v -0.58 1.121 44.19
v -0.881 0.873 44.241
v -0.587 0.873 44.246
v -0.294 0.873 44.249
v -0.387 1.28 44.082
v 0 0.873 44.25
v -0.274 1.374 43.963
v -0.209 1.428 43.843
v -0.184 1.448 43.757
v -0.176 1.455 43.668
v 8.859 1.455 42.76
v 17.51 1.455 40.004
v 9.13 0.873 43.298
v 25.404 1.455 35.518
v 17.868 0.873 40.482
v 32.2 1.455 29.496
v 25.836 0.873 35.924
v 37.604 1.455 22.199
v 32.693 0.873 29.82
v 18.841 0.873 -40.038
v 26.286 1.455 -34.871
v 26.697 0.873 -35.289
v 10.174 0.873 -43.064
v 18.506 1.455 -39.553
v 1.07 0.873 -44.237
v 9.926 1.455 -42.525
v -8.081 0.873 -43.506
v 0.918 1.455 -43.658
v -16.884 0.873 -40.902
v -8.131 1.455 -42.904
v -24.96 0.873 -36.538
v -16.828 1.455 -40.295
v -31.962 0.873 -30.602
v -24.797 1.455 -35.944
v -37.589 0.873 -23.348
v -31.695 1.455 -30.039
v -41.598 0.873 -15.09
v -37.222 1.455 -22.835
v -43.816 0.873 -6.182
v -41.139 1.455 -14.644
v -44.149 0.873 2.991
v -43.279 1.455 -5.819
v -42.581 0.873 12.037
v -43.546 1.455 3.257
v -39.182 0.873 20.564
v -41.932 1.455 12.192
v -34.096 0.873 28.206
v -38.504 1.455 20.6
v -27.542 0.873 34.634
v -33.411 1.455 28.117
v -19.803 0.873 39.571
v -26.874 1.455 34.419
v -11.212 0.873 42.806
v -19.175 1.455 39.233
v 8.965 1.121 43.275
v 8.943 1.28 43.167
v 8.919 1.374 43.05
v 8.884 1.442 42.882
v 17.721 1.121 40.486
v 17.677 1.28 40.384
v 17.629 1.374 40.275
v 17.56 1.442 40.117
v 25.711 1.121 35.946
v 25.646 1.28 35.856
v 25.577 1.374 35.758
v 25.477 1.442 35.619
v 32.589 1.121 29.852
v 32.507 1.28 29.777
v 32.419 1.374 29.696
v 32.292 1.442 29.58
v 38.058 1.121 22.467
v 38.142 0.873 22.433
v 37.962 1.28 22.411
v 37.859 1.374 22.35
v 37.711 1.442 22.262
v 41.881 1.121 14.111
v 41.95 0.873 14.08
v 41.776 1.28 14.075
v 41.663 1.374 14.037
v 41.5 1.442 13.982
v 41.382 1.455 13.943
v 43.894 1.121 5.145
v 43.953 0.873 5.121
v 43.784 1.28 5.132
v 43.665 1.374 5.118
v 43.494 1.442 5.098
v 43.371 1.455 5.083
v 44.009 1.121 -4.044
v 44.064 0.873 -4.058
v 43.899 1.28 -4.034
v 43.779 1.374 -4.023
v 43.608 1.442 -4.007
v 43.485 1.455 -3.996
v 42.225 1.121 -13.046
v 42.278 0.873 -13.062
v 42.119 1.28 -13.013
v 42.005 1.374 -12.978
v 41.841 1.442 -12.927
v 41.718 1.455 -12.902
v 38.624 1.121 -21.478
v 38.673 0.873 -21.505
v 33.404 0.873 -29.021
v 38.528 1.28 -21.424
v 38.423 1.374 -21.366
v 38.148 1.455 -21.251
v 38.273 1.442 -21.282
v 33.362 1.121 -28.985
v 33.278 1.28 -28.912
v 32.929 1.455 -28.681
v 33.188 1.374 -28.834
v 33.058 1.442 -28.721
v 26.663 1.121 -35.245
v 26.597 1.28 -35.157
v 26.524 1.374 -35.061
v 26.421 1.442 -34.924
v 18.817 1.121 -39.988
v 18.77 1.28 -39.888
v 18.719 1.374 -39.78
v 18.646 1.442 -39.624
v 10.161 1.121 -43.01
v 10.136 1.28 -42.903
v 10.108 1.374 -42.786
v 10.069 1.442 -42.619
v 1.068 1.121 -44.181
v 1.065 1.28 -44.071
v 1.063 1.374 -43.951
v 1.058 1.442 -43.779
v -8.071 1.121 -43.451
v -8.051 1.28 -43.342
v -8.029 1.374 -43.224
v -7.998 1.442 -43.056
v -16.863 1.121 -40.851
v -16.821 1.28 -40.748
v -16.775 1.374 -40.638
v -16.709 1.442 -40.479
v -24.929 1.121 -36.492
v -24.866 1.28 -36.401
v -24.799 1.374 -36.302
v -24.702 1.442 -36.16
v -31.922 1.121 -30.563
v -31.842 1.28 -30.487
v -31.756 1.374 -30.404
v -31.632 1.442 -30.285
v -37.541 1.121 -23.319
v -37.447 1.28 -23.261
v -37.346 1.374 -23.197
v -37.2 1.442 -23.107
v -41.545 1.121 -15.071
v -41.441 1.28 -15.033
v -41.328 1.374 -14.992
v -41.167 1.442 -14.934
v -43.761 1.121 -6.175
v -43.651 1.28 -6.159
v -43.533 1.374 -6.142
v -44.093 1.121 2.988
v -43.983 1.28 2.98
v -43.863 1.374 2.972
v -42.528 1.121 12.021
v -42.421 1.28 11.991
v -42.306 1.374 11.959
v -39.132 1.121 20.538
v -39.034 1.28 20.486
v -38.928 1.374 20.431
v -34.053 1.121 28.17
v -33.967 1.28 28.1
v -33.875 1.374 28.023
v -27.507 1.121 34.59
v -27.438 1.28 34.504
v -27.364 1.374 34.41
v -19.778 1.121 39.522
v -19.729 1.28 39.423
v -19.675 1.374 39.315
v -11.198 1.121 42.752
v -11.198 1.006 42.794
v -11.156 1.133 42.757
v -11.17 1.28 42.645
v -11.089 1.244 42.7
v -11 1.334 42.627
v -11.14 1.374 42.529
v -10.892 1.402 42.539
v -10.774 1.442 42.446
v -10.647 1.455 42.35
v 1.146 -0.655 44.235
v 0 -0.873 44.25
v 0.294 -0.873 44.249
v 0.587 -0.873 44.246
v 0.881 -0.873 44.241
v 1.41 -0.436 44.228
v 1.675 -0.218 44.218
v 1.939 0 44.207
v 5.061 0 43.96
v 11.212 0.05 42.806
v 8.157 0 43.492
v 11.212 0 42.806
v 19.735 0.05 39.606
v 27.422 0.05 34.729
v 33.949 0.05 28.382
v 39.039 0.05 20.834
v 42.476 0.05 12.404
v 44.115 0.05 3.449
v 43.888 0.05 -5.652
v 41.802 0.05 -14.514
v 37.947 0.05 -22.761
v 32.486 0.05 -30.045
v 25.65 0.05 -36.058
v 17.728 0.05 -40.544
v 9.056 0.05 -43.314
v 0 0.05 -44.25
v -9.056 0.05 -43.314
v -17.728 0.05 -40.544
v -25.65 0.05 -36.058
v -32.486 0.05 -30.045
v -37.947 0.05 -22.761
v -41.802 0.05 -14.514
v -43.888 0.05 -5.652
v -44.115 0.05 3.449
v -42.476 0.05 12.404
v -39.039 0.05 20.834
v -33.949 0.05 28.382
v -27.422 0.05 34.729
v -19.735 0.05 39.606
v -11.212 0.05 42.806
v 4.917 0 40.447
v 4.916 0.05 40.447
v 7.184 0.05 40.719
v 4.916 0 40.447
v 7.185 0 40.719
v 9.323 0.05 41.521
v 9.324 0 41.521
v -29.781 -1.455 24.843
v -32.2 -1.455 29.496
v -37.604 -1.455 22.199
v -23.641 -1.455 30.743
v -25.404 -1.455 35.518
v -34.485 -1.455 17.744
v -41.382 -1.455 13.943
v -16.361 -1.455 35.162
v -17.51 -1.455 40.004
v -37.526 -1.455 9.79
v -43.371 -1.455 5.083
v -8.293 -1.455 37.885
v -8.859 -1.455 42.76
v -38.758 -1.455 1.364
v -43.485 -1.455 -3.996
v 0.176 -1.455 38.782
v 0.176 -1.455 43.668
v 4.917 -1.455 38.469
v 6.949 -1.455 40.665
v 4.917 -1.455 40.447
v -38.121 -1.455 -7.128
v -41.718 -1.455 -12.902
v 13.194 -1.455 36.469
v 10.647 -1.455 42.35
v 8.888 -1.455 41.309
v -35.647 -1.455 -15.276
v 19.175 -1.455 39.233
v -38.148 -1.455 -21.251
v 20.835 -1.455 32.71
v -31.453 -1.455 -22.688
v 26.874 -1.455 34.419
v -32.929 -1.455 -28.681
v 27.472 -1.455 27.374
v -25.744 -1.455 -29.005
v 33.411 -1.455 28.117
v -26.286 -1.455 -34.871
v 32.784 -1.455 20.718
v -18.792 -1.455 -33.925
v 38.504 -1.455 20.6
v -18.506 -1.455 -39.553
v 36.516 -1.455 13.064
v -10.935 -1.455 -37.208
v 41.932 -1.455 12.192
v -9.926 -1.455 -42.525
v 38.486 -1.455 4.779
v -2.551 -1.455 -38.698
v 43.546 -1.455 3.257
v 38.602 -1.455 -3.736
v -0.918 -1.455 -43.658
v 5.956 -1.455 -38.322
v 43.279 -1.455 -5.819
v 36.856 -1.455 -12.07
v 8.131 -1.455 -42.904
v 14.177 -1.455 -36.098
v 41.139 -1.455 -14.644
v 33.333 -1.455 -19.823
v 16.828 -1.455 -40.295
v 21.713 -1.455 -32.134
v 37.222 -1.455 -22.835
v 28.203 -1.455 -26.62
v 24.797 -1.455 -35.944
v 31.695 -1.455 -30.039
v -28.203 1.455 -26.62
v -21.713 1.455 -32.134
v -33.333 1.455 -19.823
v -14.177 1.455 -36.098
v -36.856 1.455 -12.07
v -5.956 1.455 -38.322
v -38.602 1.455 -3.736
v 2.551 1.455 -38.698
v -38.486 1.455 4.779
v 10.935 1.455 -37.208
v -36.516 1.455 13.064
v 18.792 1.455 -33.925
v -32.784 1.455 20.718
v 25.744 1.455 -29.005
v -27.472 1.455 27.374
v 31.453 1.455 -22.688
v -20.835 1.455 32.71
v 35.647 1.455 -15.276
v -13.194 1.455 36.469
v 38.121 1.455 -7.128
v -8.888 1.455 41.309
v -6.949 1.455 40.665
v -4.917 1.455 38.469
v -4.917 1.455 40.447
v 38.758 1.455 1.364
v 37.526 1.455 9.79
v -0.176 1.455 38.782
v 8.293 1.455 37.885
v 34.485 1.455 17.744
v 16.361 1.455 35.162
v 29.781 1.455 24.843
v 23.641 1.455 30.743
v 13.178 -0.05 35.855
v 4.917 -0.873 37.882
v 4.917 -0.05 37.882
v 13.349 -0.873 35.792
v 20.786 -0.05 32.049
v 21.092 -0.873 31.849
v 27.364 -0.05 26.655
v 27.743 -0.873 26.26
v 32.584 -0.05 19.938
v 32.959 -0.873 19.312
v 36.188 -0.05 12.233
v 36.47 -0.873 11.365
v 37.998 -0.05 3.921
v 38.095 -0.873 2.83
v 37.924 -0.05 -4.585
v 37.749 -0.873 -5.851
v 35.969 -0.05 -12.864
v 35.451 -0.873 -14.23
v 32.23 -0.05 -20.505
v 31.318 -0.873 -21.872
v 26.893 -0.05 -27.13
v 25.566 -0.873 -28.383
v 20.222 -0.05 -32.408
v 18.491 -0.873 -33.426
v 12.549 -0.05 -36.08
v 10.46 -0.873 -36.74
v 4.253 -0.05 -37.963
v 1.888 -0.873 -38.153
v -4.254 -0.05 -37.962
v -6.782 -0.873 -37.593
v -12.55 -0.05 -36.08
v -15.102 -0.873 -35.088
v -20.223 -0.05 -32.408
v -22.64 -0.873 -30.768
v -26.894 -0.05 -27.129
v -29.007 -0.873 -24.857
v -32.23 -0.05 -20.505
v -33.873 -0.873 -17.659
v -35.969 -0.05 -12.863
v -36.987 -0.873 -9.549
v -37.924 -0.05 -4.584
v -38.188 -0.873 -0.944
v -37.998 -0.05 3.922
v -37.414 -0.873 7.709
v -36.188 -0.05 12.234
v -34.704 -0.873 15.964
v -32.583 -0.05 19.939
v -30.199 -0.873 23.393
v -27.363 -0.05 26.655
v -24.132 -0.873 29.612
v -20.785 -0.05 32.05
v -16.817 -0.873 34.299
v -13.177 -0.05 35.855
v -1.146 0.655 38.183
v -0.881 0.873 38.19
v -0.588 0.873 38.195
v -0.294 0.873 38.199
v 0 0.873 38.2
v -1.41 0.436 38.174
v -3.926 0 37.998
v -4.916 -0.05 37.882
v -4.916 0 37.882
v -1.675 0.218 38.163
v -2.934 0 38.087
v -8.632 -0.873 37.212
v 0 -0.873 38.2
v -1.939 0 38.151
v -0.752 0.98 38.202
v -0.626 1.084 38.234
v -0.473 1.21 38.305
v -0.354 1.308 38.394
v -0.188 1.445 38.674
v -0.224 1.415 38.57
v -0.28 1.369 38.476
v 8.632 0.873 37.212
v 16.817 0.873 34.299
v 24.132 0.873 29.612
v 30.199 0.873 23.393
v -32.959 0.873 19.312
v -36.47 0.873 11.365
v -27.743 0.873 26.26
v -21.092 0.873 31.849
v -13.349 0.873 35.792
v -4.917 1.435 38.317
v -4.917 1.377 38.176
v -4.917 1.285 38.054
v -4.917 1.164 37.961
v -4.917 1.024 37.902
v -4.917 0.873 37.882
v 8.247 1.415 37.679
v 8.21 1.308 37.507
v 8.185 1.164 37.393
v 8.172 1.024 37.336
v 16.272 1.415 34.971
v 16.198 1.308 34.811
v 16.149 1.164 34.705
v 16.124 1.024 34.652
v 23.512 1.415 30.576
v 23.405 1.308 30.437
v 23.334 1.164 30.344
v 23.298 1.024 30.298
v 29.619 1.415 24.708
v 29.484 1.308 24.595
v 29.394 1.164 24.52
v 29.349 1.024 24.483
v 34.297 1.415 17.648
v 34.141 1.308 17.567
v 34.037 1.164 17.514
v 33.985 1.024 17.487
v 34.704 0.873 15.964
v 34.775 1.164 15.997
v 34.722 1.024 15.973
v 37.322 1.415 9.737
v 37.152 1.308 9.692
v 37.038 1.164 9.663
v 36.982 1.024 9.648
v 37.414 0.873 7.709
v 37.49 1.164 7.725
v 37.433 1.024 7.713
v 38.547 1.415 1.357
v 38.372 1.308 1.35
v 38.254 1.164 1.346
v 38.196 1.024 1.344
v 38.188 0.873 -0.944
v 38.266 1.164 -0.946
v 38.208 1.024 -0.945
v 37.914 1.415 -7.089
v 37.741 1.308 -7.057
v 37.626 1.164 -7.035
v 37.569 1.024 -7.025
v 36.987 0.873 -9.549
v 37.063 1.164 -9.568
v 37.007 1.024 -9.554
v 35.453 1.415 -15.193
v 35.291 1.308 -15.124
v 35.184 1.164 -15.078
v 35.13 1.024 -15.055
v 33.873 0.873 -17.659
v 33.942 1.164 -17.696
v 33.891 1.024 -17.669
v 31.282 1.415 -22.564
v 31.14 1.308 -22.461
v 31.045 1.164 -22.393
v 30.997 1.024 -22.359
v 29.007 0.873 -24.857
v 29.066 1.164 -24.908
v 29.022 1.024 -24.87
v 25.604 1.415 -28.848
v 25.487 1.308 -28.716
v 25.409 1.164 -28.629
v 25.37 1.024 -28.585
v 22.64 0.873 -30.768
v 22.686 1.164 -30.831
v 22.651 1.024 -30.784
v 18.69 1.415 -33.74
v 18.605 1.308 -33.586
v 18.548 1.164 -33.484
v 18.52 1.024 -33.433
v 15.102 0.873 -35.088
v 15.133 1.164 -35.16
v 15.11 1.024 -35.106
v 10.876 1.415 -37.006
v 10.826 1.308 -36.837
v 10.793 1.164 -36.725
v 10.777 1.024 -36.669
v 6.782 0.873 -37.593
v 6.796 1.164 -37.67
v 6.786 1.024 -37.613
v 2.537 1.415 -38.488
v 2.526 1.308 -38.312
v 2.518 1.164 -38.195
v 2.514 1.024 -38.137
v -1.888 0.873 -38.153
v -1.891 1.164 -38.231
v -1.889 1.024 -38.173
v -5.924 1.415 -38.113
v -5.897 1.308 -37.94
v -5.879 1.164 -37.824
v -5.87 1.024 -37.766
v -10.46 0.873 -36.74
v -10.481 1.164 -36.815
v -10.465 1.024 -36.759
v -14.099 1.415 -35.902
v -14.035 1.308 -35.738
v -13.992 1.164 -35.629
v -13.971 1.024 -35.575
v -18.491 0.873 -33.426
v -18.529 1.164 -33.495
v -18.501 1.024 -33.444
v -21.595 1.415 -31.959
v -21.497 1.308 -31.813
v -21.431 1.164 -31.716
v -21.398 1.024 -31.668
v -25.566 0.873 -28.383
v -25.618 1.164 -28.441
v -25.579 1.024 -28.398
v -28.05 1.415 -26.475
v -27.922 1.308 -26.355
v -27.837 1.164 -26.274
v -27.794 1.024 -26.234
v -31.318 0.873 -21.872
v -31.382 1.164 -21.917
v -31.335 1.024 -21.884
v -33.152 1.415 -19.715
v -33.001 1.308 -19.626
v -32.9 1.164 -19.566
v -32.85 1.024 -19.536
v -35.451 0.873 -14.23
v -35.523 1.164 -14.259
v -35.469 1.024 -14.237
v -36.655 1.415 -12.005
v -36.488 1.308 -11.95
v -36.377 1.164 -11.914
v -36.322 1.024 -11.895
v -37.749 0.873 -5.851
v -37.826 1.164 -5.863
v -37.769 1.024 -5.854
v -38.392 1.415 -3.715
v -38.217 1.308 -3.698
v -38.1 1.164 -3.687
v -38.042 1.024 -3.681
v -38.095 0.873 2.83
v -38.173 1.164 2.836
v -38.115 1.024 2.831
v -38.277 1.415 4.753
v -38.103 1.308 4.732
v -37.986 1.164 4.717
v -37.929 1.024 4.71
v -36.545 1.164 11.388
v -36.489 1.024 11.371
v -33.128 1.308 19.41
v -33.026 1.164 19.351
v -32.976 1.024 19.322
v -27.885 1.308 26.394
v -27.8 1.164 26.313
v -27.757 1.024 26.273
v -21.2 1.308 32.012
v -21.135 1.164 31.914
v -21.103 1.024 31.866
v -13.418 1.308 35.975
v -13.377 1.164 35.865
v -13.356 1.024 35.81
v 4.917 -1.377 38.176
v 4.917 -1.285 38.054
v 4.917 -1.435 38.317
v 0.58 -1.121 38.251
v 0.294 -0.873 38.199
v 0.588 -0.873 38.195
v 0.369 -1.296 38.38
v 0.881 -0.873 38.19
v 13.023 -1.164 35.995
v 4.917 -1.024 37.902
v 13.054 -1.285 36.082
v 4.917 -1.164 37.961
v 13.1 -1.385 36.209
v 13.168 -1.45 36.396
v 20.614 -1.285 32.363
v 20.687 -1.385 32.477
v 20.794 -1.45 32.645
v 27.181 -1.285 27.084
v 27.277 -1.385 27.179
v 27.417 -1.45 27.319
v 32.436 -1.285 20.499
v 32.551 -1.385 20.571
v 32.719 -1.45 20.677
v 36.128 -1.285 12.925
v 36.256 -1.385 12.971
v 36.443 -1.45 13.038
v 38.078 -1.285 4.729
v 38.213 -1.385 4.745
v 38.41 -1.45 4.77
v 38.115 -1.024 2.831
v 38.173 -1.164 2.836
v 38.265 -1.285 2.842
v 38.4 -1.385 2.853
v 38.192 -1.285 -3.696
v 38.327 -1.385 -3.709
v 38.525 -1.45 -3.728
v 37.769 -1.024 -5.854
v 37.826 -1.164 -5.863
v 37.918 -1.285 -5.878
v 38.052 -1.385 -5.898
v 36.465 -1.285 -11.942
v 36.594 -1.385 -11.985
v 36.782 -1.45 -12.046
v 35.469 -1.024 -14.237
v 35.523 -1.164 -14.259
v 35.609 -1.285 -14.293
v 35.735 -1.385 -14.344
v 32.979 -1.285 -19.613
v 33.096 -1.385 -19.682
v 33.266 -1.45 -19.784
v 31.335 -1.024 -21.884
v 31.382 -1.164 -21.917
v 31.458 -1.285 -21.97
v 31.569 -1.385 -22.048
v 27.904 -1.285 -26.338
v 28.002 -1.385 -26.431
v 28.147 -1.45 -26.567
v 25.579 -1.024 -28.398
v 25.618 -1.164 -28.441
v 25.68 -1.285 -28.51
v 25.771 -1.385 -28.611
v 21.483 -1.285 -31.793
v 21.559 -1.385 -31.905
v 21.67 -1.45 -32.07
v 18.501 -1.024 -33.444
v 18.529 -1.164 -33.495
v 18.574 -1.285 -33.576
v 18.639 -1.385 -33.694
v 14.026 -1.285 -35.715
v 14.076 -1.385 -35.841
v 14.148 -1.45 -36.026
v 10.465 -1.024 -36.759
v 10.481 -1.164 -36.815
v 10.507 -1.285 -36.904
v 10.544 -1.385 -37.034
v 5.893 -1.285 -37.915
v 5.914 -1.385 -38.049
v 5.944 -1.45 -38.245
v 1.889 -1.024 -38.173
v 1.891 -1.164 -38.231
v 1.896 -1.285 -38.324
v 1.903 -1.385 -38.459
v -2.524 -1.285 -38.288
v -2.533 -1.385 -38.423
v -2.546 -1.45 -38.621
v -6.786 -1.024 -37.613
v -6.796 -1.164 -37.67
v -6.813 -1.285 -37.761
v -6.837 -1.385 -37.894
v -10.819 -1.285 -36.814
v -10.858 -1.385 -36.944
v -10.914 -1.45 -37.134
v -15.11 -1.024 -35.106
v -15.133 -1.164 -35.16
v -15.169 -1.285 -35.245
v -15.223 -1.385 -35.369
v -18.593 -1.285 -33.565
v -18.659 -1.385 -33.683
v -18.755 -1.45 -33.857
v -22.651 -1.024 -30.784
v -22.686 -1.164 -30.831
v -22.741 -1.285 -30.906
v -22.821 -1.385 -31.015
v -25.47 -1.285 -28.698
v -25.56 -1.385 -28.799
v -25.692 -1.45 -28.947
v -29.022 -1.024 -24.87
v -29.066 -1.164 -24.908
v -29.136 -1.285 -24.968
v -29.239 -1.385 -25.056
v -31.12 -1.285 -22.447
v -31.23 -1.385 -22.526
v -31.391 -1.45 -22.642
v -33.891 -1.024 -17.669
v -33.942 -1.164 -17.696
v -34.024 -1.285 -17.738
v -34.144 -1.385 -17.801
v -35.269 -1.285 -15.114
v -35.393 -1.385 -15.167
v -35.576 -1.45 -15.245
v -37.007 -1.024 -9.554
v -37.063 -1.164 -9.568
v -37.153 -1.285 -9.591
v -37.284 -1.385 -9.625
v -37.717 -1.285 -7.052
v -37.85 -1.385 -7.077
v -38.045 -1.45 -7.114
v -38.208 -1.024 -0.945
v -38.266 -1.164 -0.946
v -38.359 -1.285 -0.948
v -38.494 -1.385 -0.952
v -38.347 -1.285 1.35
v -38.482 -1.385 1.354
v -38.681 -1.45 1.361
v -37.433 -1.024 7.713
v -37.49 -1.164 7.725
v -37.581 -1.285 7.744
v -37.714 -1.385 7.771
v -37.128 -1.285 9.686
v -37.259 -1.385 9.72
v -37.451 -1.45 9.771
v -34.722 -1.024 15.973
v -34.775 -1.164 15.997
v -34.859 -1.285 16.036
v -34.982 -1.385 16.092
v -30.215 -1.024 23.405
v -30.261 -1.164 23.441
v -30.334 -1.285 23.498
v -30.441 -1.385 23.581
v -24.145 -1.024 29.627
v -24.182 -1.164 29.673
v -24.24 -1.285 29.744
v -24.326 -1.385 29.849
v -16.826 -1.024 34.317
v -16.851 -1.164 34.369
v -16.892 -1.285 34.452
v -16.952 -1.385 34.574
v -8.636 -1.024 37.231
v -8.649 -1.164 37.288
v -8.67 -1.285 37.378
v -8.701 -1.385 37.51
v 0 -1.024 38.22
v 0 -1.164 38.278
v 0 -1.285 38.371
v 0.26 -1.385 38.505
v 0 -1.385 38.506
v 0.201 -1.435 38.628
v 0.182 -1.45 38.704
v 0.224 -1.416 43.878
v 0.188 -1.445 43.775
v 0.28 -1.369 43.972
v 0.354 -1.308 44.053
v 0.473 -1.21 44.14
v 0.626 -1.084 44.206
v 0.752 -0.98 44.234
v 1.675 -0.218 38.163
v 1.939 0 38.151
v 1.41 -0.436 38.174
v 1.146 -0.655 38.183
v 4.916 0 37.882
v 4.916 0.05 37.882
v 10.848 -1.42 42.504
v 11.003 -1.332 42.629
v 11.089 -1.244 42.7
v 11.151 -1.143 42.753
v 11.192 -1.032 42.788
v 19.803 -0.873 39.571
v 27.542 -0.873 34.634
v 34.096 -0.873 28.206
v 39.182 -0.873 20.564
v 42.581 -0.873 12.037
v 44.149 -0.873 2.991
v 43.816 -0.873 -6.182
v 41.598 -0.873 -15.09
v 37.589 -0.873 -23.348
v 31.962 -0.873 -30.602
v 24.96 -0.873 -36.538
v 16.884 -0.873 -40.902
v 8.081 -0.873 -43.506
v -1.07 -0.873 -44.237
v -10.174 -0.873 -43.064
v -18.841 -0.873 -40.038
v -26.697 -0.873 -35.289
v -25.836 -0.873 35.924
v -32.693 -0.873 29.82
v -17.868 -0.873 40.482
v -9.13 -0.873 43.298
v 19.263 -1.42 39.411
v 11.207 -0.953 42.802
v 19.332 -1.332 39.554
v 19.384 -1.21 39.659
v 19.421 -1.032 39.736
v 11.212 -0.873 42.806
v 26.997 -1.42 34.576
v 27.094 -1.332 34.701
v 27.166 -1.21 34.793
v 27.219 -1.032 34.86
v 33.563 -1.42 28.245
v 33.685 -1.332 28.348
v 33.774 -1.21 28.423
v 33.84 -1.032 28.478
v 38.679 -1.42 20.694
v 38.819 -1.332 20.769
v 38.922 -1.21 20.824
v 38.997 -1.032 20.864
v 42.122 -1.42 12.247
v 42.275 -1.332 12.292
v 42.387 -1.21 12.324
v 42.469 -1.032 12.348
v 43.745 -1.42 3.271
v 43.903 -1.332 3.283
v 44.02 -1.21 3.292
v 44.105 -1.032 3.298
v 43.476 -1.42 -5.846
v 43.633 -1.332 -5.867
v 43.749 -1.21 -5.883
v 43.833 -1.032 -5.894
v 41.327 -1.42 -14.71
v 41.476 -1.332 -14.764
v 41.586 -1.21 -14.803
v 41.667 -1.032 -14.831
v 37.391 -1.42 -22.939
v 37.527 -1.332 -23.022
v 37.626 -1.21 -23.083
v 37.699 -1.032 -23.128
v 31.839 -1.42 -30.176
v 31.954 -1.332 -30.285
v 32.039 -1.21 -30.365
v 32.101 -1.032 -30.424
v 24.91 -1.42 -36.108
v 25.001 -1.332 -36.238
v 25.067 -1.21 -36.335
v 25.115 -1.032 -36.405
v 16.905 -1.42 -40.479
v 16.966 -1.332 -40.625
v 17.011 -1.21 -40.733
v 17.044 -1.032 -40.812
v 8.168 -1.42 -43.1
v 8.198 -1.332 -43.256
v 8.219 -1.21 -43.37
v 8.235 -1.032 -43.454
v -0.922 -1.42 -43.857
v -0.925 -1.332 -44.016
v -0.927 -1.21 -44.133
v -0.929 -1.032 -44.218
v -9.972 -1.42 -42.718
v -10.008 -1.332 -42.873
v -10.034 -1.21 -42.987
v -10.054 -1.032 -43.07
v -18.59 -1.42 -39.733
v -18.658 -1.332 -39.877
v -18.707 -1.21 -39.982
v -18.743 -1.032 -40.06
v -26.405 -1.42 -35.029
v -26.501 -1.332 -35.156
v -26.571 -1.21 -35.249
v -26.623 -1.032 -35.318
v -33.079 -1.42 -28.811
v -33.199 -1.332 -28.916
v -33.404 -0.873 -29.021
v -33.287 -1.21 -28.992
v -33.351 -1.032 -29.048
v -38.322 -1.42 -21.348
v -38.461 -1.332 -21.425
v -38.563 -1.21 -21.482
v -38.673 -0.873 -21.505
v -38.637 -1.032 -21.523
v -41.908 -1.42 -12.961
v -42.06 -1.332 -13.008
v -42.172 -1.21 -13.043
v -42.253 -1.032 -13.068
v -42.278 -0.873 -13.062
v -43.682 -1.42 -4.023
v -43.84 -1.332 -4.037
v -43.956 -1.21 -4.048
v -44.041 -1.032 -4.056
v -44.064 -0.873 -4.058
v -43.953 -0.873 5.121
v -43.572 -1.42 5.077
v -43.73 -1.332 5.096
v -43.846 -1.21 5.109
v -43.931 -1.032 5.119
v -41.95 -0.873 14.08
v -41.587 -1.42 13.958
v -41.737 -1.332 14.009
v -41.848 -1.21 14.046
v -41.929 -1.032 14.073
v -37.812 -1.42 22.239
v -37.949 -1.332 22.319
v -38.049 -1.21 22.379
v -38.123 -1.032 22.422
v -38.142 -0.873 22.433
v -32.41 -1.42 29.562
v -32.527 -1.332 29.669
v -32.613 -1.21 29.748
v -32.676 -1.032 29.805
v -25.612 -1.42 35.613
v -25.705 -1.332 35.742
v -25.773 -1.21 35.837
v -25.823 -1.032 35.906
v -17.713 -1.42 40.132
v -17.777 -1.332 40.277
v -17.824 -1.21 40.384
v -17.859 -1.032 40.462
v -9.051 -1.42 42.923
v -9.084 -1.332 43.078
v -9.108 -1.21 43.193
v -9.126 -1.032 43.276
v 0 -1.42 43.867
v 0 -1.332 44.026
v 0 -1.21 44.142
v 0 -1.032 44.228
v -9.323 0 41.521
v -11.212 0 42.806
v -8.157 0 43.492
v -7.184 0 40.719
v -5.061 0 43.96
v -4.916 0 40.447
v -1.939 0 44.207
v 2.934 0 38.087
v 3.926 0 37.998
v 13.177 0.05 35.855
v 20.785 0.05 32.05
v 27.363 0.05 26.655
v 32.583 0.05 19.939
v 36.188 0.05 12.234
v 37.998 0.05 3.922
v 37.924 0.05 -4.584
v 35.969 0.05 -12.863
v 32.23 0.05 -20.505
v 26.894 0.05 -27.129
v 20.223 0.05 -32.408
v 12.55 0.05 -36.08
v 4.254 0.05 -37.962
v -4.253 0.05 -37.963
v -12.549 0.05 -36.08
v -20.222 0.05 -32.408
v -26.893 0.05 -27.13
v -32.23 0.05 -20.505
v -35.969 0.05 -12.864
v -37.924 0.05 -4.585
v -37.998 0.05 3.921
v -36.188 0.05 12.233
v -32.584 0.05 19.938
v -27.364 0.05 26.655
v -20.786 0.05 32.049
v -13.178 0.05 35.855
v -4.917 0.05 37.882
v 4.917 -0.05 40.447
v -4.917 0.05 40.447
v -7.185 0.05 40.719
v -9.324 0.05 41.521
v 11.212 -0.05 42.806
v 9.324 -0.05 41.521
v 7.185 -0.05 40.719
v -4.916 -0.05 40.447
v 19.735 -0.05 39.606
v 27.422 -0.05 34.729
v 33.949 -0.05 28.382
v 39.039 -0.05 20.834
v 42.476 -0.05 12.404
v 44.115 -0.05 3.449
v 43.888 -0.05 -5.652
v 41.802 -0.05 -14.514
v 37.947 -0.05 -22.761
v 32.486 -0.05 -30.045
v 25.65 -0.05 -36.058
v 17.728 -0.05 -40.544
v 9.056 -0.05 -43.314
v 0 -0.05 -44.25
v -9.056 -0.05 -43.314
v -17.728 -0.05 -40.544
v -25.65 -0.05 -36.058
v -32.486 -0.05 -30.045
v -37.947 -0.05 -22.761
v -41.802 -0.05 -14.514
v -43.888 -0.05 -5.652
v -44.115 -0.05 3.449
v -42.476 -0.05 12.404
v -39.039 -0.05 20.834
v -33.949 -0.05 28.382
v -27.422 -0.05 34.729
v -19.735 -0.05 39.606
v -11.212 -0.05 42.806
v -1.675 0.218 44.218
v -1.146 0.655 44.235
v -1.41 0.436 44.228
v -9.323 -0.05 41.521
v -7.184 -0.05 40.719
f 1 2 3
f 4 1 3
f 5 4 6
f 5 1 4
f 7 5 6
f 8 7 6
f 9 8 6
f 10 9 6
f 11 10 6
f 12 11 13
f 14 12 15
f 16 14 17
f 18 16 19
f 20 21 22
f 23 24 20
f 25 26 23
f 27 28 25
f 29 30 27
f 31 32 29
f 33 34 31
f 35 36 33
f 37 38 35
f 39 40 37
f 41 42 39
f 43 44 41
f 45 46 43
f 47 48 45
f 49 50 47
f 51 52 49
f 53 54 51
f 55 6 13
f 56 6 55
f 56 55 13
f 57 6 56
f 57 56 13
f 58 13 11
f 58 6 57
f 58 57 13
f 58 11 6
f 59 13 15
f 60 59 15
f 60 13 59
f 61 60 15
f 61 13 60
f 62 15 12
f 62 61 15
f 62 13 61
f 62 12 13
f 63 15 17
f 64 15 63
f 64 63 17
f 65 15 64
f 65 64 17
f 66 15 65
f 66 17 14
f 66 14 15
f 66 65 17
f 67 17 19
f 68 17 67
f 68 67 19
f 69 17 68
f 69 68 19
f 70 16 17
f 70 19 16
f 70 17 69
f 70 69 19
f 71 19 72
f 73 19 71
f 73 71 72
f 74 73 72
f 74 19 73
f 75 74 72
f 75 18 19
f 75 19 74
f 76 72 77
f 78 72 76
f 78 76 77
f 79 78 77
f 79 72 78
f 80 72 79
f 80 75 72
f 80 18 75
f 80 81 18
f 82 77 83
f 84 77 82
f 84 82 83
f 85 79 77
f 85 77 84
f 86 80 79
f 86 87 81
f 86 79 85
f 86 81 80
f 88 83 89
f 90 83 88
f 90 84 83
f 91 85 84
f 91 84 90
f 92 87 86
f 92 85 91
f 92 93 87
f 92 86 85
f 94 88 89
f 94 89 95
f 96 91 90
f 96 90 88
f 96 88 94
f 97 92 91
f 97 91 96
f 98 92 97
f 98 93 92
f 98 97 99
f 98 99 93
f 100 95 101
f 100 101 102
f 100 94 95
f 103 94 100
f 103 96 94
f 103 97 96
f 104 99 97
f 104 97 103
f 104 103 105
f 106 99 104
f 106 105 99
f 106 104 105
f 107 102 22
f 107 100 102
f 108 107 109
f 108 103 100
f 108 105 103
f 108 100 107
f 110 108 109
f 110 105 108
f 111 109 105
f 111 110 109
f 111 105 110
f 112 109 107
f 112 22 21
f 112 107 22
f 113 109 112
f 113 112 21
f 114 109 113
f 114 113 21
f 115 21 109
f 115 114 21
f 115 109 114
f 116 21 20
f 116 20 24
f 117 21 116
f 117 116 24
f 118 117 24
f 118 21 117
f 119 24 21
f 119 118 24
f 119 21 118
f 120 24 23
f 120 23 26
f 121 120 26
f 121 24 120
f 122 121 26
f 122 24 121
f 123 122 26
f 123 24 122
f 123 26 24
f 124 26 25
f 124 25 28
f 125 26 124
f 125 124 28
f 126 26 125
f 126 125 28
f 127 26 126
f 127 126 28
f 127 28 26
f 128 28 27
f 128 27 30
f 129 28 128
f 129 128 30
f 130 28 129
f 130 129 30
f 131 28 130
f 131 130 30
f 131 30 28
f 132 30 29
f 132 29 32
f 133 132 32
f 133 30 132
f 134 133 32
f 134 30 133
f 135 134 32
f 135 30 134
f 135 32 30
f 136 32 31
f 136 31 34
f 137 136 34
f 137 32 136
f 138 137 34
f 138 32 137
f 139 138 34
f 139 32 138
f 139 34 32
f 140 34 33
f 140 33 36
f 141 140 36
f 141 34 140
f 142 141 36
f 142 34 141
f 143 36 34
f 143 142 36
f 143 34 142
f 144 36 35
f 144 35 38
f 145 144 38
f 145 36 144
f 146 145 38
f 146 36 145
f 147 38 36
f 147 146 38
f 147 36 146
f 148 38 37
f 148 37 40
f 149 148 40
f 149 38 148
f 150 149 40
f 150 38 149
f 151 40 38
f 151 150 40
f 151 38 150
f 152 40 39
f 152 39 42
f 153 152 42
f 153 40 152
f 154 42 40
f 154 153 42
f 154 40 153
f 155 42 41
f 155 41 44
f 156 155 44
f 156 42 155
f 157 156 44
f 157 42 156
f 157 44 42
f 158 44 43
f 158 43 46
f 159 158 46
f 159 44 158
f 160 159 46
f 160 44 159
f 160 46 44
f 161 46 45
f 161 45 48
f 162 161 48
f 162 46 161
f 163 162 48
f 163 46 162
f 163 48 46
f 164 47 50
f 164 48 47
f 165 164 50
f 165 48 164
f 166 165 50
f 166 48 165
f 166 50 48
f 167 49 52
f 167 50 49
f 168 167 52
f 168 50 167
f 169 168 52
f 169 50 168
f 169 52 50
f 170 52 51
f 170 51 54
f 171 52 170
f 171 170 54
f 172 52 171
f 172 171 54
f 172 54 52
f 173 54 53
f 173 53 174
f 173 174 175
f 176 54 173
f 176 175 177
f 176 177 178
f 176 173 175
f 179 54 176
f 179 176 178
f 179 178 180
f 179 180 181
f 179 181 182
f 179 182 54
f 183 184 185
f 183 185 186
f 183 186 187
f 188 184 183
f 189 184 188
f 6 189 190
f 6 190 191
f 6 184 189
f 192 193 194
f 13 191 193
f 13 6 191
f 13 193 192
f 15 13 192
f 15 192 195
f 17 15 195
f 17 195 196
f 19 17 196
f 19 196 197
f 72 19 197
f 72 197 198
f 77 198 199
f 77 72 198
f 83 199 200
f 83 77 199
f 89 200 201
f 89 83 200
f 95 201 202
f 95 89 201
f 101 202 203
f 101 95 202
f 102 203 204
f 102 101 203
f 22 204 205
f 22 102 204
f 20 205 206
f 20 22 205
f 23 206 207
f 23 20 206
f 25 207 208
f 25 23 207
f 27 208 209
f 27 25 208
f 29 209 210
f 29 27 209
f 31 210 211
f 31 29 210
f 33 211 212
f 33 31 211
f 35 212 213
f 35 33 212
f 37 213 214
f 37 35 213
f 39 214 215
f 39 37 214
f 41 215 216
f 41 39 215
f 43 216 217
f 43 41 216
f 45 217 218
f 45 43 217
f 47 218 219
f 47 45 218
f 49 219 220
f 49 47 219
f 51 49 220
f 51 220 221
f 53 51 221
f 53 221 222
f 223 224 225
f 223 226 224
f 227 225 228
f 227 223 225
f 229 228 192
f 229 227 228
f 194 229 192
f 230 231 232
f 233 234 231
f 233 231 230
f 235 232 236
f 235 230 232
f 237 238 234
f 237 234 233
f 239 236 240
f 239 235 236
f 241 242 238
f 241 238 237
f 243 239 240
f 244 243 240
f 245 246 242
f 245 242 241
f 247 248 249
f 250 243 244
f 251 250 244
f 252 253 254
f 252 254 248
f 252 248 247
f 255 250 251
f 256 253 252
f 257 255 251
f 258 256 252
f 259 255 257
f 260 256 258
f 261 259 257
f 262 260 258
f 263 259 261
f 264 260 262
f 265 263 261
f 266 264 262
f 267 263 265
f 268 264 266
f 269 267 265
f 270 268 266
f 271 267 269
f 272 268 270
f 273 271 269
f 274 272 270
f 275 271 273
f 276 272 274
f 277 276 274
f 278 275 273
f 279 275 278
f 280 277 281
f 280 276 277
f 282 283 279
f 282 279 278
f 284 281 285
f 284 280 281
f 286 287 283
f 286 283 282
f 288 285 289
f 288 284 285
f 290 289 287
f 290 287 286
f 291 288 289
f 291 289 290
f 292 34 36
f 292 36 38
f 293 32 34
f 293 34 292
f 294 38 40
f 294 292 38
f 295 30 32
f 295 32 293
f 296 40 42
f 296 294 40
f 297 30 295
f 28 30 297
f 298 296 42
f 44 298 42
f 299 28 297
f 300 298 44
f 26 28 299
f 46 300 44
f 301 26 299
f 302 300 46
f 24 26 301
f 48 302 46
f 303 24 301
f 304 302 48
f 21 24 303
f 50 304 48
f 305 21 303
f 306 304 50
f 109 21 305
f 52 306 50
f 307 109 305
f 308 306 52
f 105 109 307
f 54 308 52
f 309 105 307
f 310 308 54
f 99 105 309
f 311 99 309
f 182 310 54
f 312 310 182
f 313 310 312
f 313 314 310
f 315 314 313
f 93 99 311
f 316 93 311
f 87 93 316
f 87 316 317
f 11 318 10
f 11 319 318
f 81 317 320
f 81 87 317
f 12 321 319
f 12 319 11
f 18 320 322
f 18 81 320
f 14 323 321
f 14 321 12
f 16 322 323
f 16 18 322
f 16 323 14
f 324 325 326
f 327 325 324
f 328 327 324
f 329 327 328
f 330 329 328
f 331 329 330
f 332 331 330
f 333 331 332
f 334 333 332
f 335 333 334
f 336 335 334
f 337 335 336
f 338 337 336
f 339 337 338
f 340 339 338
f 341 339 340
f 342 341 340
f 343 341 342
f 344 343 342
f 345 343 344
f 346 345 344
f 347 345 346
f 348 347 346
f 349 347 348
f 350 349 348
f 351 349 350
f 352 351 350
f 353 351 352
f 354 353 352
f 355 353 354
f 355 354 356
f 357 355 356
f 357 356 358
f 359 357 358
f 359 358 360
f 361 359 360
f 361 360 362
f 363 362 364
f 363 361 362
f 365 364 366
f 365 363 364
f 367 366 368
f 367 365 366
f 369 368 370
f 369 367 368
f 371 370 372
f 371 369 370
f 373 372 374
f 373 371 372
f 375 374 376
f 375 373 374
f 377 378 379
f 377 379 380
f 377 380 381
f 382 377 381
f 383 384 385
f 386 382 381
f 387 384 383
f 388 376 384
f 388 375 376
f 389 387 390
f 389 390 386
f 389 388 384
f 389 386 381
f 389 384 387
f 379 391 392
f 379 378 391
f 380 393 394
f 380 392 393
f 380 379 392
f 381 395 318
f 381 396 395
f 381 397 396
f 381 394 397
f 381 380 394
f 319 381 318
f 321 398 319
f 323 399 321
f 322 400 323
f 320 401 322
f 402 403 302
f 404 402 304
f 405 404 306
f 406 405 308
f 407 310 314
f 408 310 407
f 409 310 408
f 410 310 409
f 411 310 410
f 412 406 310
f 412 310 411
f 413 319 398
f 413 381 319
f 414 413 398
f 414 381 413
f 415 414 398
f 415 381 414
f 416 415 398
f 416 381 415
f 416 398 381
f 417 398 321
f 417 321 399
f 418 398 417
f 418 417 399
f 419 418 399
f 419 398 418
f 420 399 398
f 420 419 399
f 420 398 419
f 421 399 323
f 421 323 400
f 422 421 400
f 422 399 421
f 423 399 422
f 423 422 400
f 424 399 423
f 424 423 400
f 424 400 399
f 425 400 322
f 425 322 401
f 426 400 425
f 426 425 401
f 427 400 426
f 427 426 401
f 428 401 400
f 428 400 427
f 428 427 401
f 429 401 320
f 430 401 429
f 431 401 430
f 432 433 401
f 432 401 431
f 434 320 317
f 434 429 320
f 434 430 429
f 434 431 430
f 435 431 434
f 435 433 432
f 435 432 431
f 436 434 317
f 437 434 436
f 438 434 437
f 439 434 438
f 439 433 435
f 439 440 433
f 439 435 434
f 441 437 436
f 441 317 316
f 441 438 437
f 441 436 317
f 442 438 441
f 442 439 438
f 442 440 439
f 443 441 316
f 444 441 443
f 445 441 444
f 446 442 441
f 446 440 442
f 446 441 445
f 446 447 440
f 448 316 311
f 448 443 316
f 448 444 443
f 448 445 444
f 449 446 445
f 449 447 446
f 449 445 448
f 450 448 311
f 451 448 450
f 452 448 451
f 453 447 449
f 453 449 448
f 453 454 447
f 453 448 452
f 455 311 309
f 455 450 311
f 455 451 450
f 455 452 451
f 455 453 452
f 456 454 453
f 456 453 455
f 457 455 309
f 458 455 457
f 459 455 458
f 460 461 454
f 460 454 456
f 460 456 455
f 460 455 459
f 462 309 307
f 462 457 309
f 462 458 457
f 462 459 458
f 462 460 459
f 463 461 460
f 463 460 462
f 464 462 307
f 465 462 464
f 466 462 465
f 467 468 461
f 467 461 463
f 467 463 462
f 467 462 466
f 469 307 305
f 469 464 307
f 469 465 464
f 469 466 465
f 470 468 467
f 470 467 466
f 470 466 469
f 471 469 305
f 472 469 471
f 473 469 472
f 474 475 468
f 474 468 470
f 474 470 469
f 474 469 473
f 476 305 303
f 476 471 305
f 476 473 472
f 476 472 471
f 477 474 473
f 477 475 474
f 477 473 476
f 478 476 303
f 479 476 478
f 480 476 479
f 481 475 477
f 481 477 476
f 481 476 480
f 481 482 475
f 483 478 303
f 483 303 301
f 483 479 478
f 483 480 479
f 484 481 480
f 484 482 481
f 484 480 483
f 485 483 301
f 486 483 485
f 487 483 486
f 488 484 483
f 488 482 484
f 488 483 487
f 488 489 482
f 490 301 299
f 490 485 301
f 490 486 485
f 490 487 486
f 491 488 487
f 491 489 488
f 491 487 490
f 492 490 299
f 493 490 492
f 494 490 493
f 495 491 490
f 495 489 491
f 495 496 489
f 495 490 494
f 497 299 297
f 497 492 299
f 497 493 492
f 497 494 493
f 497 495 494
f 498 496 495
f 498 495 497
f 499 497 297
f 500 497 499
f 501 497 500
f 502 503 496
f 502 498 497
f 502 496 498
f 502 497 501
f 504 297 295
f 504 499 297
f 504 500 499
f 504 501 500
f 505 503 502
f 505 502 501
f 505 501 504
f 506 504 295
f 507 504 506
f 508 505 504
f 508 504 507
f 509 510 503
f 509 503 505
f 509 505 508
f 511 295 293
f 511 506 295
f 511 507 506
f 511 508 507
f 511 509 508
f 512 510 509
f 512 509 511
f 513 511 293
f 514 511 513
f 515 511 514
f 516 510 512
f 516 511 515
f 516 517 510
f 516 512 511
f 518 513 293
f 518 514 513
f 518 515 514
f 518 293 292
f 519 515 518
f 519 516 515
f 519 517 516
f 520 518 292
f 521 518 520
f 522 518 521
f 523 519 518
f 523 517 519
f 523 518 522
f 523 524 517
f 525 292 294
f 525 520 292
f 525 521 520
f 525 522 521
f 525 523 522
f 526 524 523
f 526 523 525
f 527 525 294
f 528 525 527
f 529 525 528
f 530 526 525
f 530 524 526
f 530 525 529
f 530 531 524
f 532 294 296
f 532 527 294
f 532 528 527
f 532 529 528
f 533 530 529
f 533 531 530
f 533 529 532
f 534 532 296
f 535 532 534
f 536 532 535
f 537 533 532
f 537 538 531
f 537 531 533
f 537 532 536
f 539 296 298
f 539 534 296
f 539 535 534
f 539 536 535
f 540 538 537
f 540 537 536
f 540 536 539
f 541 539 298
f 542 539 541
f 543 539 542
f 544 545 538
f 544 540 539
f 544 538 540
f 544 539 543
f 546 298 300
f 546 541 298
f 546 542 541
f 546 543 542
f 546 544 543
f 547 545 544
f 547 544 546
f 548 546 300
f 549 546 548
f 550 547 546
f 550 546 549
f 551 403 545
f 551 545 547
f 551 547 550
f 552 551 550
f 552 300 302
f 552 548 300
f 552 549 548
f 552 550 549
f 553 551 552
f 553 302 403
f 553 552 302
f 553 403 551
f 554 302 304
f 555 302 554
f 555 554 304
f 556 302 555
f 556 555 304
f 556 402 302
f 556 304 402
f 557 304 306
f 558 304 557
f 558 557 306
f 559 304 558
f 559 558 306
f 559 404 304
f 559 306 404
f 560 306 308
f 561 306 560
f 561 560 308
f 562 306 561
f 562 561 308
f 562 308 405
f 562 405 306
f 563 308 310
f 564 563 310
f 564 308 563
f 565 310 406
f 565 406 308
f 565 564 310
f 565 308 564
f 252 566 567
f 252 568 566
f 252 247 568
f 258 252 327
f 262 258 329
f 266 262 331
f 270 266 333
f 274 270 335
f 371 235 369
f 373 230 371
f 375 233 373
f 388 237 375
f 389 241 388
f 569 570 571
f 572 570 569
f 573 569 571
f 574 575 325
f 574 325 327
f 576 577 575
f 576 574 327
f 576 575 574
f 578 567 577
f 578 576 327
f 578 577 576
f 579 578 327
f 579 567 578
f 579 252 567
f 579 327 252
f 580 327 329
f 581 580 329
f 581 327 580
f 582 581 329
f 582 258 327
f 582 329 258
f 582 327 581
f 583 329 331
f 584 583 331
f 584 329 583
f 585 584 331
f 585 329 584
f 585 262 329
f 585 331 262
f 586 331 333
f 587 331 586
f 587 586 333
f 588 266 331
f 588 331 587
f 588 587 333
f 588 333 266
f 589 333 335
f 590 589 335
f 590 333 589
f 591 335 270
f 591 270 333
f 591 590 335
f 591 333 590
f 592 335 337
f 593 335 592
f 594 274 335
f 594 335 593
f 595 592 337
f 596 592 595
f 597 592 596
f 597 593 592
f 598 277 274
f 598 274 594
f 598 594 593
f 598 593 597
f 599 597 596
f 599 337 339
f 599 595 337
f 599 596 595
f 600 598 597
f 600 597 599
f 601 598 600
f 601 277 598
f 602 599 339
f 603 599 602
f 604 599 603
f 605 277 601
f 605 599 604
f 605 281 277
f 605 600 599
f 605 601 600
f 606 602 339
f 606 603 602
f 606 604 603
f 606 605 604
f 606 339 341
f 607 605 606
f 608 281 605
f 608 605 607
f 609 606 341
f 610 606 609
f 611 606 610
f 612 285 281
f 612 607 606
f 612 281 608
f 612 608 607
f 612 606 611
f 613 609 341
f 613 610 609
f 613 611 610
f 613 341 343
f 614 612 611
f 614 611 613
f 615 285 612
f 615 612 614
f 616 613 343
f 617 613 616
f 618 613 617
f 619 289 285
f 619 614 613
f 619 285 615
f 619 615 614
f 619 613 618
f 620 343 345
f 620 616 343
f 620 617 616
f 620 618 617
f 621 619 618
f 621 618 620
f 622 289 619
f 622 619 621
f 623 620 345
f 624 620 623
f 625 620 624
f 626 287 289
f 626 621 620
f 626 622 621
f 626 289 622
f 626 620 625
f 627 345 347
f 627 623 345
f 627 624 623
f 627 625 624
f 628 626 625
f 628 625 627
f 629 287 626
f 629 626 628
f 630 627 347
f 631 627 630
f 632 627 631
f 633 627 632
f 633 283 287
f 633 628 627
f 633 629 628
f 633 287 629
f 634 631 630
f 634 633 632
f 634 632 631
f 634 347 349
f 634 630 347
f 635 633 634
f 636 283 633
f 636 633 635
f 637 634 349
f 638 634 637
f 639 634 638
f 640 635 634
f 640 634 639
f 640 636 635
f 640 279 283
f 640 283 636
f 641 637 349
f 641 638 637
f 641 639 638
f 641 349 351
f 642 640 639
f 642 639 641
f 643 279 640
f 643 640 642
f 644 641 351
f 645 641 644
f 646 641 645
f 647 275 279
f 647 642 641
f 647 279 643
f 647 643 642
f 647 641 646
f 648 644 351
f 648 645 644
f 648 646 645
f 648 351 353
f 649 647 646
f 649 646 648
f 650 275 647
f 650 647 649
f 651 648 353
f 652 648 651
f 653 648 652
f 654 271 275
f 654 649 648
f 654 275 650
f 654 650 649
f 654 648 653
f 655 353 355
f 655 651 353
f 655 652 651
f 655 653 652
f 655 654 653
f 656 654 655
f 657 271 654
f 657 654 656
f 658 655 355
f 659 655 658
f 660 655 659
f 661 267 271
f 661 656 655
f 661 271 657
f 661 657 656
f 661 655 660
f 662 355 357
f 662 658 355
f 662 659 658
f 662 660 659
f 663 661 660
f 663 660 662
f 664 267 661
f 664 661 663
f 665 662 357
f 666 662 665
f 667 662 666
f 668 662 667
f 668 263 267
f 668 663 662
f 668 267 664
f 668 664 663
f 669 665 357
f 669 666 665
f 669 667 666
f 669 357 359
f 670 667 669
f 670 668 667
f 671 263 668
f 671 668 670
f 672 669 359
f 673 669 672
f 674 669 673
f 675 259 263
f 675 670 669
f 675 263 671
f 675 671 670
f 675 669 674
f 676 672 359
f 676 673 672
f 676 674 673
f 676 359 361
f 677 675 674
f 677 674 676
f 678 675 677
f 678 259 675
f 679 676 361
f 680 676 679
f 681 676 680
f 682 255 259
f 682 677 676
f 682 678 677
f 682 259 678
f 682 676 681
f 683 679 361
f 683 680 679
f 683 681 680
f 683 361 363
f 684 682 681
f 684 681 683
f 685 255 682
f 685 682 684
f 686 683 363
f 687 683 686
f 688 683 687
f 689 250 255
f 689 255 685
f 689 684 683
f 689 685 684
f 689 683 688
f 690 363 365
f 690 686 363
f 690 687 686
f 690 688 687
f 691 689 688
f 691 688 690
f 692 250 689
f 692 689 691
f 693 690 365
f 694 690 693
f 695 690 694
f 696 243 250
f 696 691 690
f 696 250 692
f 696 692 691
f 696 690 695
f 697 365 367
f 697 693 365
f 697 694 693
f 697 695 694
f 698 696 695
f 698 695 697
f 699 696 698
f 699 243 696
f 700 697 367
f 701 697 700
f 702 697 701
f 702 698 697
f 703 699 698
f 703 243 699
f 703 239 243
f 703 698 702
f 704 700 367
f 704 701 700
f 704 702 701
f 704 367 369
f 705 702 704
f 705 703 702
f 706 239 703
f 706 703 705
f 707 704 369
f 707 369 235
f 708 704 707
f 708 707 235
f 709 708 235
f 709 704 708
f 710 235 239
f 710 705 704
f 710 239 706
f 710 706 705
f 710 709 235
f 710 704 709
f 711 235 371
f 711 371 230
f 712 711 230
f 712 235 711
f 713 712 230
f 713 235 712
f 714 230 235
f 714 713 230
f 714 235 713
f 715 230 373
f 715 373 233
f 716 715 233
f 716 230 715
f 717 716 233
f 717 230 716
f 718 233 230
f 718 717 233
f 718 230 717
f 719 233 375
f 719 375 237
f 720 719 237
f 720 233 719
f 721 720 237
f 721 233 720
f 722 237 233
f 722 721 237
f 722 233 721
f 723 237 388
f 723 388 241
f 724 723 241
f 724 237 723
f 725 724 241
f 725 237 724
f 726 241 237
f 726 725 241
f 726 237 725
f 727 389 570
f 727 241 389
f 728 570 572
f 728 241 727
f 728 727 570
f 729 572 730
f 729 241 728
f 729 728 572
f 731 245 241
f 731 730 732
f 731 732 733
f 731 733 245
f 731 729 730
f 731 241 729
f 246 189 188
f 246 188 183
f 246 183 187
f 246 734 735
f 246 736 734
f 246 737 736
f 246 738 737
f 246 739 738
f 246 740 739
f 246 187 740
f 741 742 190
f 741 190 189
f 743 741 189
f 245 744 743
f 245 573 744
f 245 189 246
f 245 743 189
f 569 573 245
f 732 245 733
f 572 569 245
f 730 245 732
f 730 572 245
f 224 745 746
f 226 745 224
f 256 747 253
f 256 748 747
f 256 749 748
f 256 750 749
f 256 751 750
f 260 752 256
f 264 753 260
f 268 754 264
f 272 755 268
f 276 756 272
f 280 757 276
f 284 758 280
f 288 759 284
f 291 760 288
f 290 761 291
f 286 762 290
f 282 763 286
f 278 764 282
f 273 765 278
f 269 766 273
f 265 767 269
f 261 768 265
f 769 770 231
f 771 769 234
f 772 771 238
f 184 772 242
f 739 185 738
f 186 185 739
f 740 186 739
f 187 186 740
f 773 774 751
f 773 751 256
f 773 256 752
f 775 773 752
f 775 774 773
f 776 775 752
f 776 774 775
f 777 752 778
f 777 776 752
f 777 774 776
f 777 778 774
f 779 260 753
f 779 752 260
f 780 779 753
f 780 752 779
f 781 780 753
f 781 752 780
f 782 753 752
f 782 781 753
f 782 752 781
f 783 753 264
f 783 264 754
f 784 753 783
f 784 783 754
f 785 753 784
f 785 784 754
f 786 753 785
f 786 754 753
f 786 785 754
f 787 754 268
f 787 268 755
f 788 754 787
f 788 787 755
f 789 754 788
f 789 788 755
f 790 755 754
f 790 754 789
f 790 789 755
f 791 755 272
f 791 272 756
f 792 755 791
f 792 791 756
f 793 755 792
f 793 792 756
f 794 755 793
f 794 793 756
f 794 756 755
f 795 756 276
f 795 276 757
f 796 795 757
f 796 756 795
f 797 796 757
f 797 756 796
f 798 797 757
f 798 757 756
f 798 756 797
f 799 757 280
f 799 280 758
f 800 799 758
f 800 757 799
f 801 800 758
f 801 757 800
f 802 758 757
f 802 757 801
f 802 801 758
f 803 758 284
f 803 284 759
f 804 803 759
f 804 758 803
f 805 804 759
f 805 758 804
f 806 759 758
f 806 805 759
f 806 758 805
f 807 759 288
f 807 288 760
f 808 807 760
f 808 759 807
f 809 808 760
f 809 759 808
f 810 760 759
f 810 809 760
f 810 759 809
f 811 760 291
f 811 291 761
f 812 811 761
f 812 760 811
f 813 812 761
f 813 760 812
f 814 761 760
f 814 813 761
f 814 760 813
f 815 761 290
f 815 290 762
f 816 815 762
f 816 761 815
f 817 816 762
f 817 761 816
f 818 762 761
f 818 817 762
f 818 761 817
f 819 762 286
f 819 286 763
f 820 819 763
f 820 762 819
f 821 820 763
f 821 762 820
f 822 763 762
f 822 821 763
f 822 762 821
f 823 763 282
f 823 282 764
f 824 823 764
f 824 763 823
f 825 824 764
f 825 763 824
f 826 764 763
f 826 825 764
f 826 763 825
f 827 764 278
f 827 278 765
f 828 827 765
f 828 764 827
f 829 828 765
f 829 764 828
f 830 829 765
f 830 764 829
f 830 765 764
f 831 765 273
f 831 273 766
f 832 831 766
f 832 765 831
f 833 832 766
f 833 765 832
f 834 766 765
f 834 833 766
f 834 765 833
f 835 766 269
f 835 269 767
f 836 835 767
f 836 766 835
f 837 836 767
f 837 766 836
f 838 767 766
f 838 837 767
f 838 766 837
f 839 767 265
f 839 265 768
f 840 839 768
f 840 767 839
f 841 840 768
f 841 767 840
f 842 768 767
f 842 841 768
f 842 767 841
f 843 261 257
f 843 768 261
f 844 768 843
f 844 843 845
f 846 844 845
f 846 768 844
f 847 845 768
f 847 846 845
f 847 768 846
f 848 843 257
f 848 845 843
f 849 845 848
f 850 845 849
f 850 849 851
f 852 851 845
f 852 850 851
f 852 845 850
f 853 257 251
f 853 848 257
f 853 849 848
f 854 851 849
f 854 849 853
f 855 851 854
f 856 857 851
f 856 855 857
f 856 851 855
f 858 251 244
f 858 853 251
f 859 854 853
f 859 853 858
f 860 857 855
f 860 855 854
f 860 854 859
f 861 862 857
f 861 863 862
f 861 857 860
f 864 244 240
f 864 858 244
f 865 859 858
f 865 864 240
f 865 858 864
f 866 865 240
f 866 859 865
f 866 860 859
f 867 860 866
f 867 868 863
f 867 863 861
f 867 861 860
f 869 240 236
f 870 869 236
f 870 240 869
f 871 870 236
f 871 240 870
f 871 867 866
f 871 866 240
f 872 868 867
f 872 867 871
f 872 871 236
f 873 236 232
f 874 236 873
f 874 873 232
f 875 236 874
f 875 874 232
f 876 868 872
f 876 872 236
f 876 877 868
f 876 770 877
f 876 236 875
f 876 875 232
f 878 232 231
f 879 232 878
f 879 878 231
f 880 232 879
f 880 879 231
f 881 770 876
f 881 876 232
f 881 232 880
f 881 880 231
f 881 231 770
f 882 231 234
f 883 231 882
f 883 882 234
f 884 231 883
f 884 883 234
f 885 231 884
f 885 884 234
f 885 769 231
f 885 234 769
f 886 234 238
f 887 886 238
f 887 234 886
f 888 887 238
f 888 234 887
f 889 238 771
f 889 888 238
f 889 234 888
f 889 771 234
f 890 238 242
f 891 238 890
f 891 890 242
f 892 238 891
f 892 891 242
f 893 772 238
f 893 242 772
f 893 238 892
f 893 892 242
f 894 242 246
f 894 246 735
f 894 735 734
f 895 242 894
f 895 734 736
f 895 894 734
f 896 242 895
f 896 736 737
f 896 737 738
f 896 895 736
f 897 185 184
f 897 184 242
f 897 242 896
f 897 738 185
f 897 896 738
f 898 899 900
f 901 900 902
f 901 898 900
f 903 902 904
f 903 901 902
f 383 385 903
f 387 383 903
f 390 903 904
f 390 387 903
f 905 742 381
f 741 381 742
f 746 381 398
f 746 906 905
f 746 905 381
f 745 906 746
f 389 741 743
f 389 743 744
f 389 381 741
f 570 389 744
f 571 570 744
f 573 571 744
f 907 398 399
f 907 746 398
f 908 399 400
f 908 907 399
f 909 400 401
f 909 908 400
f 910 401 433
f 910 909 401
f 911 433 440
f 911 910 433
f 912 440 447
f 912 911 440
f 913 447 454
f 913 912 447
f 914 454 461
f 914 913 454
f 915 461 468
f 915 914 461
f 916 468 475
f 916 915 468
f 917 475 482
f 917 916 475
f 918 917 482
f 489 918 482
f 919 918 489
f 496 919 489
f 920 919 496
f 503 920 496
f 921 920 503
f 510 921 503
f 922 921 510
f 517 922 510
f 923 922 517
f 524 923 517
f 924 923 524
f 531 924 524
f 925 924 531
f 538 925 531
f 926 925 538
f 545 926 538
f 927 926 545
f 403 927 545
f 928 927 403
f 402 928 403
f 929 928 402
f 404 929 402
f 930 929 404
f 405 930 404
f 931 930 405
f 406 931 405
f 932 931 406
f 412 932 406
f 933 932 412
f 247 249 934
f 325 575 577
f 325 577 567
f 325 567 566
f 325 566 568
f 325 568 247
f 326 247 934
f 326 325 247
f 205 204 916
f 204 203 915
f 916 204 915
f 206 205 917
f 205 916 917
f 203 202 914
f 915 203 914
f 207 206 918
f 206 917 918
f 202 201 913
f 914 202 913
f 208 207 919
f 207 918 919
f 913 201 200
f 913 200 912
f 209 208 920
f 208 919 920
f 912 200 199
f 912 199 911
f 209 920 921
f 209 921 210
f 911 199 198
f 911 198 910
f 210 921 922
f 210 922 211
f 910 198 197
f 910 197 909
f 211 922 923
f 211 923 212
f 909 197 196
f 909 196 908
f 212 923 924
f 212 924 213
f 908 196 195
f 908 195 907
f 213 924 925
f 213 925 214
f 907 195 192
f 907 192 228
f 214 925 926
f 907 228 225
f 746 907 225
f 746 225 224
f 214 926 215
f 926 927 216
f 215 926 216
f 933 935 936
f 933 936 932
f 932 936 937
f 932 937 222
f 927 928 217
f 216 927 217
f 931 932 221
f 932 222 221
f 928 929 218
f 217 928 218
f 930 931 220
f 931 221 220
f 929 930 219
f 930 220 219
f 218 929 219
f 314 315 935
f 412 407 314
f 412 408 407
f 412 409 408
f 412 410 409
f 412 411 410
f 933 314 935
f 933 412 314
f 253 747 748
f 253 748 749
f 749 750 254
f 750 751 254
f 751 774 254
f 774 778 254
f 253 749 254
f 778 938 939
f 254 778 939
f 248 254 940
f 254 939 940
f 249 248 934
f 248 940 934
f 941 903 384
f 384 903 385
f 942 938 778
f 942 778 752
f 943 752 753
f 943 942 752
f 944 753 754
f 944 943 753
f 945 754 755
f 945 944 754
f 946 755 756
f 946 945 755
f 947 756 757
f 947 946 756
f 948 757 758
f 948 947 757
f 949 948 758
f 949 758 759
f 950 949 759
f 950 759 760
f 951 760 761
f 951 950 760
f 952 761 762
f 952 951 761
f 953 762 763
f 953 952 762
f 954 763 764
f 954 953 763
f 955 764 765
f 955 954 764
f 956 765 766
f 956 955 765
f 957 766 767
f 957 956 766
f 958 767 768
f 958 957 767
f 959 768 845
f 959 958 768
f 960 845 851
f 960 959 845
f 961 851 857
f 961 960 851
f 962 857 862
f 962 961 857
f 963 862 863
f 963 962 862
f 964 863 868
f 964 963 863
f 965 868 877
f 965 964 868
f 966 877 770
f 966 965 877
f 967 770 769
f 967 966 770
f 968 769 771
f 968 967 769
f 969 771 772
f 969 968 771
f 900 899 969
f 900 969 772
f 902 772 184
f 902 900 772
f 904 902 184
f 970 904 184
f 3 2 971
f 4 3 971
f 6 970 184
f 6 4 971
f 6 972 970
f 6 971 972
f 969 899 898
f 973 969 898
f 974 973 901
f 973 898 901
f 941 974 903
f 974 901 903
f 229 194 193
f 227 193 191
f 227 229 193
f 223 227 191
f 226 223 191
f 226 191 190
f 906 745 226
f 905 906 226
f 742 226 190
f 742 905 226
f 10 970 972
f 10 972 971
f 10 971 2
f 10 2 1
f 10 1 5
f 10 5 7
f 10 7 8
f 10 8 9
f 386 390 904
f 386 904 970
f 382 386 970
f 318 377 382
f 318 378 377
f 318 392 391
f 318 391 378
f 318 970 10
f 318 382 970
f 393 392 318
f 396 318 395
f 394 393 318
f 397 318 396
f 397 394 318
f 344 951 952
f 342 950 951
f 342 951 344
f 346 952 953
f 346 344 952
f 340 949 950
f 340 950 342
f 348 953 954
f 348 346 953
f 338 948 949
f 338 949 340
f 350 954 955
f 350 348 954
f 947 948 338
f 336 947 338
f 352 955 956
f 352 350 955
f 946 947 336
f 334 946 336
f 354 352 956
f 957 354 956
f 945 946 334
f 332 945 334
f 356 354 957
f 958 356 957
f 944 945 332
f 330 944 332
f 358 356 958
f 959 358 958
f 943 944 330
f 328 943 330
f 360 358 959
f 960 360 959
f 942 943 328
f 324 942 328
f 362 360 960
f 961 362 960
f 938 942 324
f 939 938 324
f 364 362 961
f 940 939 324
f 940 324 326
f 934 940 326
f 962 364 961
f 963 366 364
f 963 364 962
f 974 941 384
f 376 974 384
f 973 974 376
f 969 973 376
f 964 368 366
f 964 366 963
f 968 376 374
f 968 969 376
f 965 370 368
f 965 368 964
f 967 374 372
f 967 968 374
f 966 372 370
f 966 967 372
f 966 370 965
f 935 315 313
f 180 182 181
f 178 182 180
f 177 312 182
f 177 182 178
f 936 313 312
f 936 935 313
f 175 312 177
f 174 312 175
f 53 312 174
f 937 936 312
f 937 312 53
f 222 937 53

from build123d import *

# Parameters (mm, degrees)
EXTRUDE1_DEPTH      = 88.5
EXTRUDE2_DEPTH      = 88.5
EXTRUDE3_DEPTH      = 88.5
EXTRUDE4_DEPTH      = 88.5
EXTRUDE5_DEPTH      = 0.05
EXTRUDE5_DEPTH_BACK = 0.05


with BuildPart() as part:
    # Sketch1 → Revolve1 (revolve)
    with BuildSketch(Plane(origin=(0, 0, 0), x_dir=(0, 0, -1), z_dir=(1, 0, 0)), mode=Mode.PRIVATE) as revolve1_sk:
        with BuildLine():
            Line((38.2, 0.873), (38.2, -0.873))
            ThreePointArc((38.2, -0.873), (38.370463853, -1.284536147), (38.782, -1.455))
            Line((38.782, -1.455), (43.668, -1.455))
            ThreePointArc((43.668, -1.455), (44.079536147, -1.284536147), (44.25, -0.873))
            Line((44.25, -0.873), (44.25, 0.873))
            ThreePointArc((44.25, 0.873), (44.079536147, 1.284536147), (43.668, 1.455))
            Line((43.668, 1.455), (38.782, 1.455))
            ThreePointArc((38.782, 1.455), (38.370463853, 1.284536147), (38.2, 0.873))
        make_face()
    revolve(revolve1_sk.sketch.rotate(Axis((0, -1, 0), (0, 1, 0)), 180), axis=Axis((0, -1, 0), (0, 1, 0)))

    # Sketch2 → Extrude1 (cut)
    with BuildSketch(Plane(origin=(0, 0, 0), x_dir=(-1, 0, 0), z_dir=(0, 1, 0))):
        with BuildLine():
            Line((4.915666667, 59.605170172), (4.915666667, 40.446836943))
            ThreePointArc((4.915666667, 40.446836943), (14.495833333, 50.026003557), (4.915666667, 59.605170172))
        make_face()
    extrude(amount=EXTRUDE1_DEPTH, mode=Mode.SUBTRACT)

    # Sketch3 → Extrude2 (cut)
    with BuildSketch(Plane(origin=(0, 0, 0), x_dir=(-1, 0, 0), z_dir=(0, 1, 0))):
        with BuildLine():
            Line((-4.915666667, 40.446836943), (-4.915666667, 59.605170172))
            ThreePointArc((-4.915666667, 59.605170172), (-14.495833333, 50.026003557), (-4.915666667, 40.446836943))
        make_face()
    extrude(amount=-EXTRUDE2_DEPTH, mode=Mode.SUBTRACT)

    # Sketch4 → Extrude3 (cut)
    with BuildSketch(Plane.XY):
        Polygon((-4.916666667, 0), (-1.939393939, 0), (1.94, 3.2005), (-4.916666667, 3.2005), align=None)
    extrude(amount=EXTRUDE3_DEPTH, mode=Mode.SUBTRACT)

    # Sketch5 → Extrude4 (cut)
    with BuildSketch(Plane.XY):
        Polygon((-1.94, -3.2005), (4.916666667, -3.2005), (4.916666667, 0), (1.939393939, 0), align=None)
    extrude(amount=EXTRUDE4_DEPTH, mode=Mode.SUBTRACT)

    # Sketch6 → Extrude5 (cut, two sides)
    with BuildSketch(Plane(origin=(0, 0, 0), x_dir=(-1, 0, 0), z_dir=(0, 1, 0))) as extrude5_sk:
        with BuildLine():
            Line((45.135, -45.135), (45.135, 45.135))
            Line((45.135, 45.135), (13.153080827, 45.135))
            ThreePointArc((13.153080827, 45.135), (9.654834014, 41.700728534), (4.915666667, 40.446836943))
            Line((4.915666667, 40.446836943), (4.915666667, 37.872316027))
            ThreePointArc((4.915666667, 37.872316027), (0, 38.19), (-4.915666667, 37.872316027))
            Line((-4.915666667, 37.872316027), (-4.915666667, 40.446836943))
            ThreePointArc((-4.915666667, 40.446836943), (-9.654834014, 41.700728534), (-13.153080827, 45.135))
            Line((-13.153080827, 45.135), (-45.135, 45.135))
            Line((-45.135, 45.135), (-45.135, -45.135))
            Line((-45.135, -45.135), (45.135, -45.135))
        make_face()
    extrude(amount=EXTRUDE5_DEPTH, mode=Mode.SUBTRACT)
    extrude(extrude5_sk.sketch, amount=-EXTRUDE5_DEPTH_BACK, mode=Mode.SUBTRACT)


solid = part.part
